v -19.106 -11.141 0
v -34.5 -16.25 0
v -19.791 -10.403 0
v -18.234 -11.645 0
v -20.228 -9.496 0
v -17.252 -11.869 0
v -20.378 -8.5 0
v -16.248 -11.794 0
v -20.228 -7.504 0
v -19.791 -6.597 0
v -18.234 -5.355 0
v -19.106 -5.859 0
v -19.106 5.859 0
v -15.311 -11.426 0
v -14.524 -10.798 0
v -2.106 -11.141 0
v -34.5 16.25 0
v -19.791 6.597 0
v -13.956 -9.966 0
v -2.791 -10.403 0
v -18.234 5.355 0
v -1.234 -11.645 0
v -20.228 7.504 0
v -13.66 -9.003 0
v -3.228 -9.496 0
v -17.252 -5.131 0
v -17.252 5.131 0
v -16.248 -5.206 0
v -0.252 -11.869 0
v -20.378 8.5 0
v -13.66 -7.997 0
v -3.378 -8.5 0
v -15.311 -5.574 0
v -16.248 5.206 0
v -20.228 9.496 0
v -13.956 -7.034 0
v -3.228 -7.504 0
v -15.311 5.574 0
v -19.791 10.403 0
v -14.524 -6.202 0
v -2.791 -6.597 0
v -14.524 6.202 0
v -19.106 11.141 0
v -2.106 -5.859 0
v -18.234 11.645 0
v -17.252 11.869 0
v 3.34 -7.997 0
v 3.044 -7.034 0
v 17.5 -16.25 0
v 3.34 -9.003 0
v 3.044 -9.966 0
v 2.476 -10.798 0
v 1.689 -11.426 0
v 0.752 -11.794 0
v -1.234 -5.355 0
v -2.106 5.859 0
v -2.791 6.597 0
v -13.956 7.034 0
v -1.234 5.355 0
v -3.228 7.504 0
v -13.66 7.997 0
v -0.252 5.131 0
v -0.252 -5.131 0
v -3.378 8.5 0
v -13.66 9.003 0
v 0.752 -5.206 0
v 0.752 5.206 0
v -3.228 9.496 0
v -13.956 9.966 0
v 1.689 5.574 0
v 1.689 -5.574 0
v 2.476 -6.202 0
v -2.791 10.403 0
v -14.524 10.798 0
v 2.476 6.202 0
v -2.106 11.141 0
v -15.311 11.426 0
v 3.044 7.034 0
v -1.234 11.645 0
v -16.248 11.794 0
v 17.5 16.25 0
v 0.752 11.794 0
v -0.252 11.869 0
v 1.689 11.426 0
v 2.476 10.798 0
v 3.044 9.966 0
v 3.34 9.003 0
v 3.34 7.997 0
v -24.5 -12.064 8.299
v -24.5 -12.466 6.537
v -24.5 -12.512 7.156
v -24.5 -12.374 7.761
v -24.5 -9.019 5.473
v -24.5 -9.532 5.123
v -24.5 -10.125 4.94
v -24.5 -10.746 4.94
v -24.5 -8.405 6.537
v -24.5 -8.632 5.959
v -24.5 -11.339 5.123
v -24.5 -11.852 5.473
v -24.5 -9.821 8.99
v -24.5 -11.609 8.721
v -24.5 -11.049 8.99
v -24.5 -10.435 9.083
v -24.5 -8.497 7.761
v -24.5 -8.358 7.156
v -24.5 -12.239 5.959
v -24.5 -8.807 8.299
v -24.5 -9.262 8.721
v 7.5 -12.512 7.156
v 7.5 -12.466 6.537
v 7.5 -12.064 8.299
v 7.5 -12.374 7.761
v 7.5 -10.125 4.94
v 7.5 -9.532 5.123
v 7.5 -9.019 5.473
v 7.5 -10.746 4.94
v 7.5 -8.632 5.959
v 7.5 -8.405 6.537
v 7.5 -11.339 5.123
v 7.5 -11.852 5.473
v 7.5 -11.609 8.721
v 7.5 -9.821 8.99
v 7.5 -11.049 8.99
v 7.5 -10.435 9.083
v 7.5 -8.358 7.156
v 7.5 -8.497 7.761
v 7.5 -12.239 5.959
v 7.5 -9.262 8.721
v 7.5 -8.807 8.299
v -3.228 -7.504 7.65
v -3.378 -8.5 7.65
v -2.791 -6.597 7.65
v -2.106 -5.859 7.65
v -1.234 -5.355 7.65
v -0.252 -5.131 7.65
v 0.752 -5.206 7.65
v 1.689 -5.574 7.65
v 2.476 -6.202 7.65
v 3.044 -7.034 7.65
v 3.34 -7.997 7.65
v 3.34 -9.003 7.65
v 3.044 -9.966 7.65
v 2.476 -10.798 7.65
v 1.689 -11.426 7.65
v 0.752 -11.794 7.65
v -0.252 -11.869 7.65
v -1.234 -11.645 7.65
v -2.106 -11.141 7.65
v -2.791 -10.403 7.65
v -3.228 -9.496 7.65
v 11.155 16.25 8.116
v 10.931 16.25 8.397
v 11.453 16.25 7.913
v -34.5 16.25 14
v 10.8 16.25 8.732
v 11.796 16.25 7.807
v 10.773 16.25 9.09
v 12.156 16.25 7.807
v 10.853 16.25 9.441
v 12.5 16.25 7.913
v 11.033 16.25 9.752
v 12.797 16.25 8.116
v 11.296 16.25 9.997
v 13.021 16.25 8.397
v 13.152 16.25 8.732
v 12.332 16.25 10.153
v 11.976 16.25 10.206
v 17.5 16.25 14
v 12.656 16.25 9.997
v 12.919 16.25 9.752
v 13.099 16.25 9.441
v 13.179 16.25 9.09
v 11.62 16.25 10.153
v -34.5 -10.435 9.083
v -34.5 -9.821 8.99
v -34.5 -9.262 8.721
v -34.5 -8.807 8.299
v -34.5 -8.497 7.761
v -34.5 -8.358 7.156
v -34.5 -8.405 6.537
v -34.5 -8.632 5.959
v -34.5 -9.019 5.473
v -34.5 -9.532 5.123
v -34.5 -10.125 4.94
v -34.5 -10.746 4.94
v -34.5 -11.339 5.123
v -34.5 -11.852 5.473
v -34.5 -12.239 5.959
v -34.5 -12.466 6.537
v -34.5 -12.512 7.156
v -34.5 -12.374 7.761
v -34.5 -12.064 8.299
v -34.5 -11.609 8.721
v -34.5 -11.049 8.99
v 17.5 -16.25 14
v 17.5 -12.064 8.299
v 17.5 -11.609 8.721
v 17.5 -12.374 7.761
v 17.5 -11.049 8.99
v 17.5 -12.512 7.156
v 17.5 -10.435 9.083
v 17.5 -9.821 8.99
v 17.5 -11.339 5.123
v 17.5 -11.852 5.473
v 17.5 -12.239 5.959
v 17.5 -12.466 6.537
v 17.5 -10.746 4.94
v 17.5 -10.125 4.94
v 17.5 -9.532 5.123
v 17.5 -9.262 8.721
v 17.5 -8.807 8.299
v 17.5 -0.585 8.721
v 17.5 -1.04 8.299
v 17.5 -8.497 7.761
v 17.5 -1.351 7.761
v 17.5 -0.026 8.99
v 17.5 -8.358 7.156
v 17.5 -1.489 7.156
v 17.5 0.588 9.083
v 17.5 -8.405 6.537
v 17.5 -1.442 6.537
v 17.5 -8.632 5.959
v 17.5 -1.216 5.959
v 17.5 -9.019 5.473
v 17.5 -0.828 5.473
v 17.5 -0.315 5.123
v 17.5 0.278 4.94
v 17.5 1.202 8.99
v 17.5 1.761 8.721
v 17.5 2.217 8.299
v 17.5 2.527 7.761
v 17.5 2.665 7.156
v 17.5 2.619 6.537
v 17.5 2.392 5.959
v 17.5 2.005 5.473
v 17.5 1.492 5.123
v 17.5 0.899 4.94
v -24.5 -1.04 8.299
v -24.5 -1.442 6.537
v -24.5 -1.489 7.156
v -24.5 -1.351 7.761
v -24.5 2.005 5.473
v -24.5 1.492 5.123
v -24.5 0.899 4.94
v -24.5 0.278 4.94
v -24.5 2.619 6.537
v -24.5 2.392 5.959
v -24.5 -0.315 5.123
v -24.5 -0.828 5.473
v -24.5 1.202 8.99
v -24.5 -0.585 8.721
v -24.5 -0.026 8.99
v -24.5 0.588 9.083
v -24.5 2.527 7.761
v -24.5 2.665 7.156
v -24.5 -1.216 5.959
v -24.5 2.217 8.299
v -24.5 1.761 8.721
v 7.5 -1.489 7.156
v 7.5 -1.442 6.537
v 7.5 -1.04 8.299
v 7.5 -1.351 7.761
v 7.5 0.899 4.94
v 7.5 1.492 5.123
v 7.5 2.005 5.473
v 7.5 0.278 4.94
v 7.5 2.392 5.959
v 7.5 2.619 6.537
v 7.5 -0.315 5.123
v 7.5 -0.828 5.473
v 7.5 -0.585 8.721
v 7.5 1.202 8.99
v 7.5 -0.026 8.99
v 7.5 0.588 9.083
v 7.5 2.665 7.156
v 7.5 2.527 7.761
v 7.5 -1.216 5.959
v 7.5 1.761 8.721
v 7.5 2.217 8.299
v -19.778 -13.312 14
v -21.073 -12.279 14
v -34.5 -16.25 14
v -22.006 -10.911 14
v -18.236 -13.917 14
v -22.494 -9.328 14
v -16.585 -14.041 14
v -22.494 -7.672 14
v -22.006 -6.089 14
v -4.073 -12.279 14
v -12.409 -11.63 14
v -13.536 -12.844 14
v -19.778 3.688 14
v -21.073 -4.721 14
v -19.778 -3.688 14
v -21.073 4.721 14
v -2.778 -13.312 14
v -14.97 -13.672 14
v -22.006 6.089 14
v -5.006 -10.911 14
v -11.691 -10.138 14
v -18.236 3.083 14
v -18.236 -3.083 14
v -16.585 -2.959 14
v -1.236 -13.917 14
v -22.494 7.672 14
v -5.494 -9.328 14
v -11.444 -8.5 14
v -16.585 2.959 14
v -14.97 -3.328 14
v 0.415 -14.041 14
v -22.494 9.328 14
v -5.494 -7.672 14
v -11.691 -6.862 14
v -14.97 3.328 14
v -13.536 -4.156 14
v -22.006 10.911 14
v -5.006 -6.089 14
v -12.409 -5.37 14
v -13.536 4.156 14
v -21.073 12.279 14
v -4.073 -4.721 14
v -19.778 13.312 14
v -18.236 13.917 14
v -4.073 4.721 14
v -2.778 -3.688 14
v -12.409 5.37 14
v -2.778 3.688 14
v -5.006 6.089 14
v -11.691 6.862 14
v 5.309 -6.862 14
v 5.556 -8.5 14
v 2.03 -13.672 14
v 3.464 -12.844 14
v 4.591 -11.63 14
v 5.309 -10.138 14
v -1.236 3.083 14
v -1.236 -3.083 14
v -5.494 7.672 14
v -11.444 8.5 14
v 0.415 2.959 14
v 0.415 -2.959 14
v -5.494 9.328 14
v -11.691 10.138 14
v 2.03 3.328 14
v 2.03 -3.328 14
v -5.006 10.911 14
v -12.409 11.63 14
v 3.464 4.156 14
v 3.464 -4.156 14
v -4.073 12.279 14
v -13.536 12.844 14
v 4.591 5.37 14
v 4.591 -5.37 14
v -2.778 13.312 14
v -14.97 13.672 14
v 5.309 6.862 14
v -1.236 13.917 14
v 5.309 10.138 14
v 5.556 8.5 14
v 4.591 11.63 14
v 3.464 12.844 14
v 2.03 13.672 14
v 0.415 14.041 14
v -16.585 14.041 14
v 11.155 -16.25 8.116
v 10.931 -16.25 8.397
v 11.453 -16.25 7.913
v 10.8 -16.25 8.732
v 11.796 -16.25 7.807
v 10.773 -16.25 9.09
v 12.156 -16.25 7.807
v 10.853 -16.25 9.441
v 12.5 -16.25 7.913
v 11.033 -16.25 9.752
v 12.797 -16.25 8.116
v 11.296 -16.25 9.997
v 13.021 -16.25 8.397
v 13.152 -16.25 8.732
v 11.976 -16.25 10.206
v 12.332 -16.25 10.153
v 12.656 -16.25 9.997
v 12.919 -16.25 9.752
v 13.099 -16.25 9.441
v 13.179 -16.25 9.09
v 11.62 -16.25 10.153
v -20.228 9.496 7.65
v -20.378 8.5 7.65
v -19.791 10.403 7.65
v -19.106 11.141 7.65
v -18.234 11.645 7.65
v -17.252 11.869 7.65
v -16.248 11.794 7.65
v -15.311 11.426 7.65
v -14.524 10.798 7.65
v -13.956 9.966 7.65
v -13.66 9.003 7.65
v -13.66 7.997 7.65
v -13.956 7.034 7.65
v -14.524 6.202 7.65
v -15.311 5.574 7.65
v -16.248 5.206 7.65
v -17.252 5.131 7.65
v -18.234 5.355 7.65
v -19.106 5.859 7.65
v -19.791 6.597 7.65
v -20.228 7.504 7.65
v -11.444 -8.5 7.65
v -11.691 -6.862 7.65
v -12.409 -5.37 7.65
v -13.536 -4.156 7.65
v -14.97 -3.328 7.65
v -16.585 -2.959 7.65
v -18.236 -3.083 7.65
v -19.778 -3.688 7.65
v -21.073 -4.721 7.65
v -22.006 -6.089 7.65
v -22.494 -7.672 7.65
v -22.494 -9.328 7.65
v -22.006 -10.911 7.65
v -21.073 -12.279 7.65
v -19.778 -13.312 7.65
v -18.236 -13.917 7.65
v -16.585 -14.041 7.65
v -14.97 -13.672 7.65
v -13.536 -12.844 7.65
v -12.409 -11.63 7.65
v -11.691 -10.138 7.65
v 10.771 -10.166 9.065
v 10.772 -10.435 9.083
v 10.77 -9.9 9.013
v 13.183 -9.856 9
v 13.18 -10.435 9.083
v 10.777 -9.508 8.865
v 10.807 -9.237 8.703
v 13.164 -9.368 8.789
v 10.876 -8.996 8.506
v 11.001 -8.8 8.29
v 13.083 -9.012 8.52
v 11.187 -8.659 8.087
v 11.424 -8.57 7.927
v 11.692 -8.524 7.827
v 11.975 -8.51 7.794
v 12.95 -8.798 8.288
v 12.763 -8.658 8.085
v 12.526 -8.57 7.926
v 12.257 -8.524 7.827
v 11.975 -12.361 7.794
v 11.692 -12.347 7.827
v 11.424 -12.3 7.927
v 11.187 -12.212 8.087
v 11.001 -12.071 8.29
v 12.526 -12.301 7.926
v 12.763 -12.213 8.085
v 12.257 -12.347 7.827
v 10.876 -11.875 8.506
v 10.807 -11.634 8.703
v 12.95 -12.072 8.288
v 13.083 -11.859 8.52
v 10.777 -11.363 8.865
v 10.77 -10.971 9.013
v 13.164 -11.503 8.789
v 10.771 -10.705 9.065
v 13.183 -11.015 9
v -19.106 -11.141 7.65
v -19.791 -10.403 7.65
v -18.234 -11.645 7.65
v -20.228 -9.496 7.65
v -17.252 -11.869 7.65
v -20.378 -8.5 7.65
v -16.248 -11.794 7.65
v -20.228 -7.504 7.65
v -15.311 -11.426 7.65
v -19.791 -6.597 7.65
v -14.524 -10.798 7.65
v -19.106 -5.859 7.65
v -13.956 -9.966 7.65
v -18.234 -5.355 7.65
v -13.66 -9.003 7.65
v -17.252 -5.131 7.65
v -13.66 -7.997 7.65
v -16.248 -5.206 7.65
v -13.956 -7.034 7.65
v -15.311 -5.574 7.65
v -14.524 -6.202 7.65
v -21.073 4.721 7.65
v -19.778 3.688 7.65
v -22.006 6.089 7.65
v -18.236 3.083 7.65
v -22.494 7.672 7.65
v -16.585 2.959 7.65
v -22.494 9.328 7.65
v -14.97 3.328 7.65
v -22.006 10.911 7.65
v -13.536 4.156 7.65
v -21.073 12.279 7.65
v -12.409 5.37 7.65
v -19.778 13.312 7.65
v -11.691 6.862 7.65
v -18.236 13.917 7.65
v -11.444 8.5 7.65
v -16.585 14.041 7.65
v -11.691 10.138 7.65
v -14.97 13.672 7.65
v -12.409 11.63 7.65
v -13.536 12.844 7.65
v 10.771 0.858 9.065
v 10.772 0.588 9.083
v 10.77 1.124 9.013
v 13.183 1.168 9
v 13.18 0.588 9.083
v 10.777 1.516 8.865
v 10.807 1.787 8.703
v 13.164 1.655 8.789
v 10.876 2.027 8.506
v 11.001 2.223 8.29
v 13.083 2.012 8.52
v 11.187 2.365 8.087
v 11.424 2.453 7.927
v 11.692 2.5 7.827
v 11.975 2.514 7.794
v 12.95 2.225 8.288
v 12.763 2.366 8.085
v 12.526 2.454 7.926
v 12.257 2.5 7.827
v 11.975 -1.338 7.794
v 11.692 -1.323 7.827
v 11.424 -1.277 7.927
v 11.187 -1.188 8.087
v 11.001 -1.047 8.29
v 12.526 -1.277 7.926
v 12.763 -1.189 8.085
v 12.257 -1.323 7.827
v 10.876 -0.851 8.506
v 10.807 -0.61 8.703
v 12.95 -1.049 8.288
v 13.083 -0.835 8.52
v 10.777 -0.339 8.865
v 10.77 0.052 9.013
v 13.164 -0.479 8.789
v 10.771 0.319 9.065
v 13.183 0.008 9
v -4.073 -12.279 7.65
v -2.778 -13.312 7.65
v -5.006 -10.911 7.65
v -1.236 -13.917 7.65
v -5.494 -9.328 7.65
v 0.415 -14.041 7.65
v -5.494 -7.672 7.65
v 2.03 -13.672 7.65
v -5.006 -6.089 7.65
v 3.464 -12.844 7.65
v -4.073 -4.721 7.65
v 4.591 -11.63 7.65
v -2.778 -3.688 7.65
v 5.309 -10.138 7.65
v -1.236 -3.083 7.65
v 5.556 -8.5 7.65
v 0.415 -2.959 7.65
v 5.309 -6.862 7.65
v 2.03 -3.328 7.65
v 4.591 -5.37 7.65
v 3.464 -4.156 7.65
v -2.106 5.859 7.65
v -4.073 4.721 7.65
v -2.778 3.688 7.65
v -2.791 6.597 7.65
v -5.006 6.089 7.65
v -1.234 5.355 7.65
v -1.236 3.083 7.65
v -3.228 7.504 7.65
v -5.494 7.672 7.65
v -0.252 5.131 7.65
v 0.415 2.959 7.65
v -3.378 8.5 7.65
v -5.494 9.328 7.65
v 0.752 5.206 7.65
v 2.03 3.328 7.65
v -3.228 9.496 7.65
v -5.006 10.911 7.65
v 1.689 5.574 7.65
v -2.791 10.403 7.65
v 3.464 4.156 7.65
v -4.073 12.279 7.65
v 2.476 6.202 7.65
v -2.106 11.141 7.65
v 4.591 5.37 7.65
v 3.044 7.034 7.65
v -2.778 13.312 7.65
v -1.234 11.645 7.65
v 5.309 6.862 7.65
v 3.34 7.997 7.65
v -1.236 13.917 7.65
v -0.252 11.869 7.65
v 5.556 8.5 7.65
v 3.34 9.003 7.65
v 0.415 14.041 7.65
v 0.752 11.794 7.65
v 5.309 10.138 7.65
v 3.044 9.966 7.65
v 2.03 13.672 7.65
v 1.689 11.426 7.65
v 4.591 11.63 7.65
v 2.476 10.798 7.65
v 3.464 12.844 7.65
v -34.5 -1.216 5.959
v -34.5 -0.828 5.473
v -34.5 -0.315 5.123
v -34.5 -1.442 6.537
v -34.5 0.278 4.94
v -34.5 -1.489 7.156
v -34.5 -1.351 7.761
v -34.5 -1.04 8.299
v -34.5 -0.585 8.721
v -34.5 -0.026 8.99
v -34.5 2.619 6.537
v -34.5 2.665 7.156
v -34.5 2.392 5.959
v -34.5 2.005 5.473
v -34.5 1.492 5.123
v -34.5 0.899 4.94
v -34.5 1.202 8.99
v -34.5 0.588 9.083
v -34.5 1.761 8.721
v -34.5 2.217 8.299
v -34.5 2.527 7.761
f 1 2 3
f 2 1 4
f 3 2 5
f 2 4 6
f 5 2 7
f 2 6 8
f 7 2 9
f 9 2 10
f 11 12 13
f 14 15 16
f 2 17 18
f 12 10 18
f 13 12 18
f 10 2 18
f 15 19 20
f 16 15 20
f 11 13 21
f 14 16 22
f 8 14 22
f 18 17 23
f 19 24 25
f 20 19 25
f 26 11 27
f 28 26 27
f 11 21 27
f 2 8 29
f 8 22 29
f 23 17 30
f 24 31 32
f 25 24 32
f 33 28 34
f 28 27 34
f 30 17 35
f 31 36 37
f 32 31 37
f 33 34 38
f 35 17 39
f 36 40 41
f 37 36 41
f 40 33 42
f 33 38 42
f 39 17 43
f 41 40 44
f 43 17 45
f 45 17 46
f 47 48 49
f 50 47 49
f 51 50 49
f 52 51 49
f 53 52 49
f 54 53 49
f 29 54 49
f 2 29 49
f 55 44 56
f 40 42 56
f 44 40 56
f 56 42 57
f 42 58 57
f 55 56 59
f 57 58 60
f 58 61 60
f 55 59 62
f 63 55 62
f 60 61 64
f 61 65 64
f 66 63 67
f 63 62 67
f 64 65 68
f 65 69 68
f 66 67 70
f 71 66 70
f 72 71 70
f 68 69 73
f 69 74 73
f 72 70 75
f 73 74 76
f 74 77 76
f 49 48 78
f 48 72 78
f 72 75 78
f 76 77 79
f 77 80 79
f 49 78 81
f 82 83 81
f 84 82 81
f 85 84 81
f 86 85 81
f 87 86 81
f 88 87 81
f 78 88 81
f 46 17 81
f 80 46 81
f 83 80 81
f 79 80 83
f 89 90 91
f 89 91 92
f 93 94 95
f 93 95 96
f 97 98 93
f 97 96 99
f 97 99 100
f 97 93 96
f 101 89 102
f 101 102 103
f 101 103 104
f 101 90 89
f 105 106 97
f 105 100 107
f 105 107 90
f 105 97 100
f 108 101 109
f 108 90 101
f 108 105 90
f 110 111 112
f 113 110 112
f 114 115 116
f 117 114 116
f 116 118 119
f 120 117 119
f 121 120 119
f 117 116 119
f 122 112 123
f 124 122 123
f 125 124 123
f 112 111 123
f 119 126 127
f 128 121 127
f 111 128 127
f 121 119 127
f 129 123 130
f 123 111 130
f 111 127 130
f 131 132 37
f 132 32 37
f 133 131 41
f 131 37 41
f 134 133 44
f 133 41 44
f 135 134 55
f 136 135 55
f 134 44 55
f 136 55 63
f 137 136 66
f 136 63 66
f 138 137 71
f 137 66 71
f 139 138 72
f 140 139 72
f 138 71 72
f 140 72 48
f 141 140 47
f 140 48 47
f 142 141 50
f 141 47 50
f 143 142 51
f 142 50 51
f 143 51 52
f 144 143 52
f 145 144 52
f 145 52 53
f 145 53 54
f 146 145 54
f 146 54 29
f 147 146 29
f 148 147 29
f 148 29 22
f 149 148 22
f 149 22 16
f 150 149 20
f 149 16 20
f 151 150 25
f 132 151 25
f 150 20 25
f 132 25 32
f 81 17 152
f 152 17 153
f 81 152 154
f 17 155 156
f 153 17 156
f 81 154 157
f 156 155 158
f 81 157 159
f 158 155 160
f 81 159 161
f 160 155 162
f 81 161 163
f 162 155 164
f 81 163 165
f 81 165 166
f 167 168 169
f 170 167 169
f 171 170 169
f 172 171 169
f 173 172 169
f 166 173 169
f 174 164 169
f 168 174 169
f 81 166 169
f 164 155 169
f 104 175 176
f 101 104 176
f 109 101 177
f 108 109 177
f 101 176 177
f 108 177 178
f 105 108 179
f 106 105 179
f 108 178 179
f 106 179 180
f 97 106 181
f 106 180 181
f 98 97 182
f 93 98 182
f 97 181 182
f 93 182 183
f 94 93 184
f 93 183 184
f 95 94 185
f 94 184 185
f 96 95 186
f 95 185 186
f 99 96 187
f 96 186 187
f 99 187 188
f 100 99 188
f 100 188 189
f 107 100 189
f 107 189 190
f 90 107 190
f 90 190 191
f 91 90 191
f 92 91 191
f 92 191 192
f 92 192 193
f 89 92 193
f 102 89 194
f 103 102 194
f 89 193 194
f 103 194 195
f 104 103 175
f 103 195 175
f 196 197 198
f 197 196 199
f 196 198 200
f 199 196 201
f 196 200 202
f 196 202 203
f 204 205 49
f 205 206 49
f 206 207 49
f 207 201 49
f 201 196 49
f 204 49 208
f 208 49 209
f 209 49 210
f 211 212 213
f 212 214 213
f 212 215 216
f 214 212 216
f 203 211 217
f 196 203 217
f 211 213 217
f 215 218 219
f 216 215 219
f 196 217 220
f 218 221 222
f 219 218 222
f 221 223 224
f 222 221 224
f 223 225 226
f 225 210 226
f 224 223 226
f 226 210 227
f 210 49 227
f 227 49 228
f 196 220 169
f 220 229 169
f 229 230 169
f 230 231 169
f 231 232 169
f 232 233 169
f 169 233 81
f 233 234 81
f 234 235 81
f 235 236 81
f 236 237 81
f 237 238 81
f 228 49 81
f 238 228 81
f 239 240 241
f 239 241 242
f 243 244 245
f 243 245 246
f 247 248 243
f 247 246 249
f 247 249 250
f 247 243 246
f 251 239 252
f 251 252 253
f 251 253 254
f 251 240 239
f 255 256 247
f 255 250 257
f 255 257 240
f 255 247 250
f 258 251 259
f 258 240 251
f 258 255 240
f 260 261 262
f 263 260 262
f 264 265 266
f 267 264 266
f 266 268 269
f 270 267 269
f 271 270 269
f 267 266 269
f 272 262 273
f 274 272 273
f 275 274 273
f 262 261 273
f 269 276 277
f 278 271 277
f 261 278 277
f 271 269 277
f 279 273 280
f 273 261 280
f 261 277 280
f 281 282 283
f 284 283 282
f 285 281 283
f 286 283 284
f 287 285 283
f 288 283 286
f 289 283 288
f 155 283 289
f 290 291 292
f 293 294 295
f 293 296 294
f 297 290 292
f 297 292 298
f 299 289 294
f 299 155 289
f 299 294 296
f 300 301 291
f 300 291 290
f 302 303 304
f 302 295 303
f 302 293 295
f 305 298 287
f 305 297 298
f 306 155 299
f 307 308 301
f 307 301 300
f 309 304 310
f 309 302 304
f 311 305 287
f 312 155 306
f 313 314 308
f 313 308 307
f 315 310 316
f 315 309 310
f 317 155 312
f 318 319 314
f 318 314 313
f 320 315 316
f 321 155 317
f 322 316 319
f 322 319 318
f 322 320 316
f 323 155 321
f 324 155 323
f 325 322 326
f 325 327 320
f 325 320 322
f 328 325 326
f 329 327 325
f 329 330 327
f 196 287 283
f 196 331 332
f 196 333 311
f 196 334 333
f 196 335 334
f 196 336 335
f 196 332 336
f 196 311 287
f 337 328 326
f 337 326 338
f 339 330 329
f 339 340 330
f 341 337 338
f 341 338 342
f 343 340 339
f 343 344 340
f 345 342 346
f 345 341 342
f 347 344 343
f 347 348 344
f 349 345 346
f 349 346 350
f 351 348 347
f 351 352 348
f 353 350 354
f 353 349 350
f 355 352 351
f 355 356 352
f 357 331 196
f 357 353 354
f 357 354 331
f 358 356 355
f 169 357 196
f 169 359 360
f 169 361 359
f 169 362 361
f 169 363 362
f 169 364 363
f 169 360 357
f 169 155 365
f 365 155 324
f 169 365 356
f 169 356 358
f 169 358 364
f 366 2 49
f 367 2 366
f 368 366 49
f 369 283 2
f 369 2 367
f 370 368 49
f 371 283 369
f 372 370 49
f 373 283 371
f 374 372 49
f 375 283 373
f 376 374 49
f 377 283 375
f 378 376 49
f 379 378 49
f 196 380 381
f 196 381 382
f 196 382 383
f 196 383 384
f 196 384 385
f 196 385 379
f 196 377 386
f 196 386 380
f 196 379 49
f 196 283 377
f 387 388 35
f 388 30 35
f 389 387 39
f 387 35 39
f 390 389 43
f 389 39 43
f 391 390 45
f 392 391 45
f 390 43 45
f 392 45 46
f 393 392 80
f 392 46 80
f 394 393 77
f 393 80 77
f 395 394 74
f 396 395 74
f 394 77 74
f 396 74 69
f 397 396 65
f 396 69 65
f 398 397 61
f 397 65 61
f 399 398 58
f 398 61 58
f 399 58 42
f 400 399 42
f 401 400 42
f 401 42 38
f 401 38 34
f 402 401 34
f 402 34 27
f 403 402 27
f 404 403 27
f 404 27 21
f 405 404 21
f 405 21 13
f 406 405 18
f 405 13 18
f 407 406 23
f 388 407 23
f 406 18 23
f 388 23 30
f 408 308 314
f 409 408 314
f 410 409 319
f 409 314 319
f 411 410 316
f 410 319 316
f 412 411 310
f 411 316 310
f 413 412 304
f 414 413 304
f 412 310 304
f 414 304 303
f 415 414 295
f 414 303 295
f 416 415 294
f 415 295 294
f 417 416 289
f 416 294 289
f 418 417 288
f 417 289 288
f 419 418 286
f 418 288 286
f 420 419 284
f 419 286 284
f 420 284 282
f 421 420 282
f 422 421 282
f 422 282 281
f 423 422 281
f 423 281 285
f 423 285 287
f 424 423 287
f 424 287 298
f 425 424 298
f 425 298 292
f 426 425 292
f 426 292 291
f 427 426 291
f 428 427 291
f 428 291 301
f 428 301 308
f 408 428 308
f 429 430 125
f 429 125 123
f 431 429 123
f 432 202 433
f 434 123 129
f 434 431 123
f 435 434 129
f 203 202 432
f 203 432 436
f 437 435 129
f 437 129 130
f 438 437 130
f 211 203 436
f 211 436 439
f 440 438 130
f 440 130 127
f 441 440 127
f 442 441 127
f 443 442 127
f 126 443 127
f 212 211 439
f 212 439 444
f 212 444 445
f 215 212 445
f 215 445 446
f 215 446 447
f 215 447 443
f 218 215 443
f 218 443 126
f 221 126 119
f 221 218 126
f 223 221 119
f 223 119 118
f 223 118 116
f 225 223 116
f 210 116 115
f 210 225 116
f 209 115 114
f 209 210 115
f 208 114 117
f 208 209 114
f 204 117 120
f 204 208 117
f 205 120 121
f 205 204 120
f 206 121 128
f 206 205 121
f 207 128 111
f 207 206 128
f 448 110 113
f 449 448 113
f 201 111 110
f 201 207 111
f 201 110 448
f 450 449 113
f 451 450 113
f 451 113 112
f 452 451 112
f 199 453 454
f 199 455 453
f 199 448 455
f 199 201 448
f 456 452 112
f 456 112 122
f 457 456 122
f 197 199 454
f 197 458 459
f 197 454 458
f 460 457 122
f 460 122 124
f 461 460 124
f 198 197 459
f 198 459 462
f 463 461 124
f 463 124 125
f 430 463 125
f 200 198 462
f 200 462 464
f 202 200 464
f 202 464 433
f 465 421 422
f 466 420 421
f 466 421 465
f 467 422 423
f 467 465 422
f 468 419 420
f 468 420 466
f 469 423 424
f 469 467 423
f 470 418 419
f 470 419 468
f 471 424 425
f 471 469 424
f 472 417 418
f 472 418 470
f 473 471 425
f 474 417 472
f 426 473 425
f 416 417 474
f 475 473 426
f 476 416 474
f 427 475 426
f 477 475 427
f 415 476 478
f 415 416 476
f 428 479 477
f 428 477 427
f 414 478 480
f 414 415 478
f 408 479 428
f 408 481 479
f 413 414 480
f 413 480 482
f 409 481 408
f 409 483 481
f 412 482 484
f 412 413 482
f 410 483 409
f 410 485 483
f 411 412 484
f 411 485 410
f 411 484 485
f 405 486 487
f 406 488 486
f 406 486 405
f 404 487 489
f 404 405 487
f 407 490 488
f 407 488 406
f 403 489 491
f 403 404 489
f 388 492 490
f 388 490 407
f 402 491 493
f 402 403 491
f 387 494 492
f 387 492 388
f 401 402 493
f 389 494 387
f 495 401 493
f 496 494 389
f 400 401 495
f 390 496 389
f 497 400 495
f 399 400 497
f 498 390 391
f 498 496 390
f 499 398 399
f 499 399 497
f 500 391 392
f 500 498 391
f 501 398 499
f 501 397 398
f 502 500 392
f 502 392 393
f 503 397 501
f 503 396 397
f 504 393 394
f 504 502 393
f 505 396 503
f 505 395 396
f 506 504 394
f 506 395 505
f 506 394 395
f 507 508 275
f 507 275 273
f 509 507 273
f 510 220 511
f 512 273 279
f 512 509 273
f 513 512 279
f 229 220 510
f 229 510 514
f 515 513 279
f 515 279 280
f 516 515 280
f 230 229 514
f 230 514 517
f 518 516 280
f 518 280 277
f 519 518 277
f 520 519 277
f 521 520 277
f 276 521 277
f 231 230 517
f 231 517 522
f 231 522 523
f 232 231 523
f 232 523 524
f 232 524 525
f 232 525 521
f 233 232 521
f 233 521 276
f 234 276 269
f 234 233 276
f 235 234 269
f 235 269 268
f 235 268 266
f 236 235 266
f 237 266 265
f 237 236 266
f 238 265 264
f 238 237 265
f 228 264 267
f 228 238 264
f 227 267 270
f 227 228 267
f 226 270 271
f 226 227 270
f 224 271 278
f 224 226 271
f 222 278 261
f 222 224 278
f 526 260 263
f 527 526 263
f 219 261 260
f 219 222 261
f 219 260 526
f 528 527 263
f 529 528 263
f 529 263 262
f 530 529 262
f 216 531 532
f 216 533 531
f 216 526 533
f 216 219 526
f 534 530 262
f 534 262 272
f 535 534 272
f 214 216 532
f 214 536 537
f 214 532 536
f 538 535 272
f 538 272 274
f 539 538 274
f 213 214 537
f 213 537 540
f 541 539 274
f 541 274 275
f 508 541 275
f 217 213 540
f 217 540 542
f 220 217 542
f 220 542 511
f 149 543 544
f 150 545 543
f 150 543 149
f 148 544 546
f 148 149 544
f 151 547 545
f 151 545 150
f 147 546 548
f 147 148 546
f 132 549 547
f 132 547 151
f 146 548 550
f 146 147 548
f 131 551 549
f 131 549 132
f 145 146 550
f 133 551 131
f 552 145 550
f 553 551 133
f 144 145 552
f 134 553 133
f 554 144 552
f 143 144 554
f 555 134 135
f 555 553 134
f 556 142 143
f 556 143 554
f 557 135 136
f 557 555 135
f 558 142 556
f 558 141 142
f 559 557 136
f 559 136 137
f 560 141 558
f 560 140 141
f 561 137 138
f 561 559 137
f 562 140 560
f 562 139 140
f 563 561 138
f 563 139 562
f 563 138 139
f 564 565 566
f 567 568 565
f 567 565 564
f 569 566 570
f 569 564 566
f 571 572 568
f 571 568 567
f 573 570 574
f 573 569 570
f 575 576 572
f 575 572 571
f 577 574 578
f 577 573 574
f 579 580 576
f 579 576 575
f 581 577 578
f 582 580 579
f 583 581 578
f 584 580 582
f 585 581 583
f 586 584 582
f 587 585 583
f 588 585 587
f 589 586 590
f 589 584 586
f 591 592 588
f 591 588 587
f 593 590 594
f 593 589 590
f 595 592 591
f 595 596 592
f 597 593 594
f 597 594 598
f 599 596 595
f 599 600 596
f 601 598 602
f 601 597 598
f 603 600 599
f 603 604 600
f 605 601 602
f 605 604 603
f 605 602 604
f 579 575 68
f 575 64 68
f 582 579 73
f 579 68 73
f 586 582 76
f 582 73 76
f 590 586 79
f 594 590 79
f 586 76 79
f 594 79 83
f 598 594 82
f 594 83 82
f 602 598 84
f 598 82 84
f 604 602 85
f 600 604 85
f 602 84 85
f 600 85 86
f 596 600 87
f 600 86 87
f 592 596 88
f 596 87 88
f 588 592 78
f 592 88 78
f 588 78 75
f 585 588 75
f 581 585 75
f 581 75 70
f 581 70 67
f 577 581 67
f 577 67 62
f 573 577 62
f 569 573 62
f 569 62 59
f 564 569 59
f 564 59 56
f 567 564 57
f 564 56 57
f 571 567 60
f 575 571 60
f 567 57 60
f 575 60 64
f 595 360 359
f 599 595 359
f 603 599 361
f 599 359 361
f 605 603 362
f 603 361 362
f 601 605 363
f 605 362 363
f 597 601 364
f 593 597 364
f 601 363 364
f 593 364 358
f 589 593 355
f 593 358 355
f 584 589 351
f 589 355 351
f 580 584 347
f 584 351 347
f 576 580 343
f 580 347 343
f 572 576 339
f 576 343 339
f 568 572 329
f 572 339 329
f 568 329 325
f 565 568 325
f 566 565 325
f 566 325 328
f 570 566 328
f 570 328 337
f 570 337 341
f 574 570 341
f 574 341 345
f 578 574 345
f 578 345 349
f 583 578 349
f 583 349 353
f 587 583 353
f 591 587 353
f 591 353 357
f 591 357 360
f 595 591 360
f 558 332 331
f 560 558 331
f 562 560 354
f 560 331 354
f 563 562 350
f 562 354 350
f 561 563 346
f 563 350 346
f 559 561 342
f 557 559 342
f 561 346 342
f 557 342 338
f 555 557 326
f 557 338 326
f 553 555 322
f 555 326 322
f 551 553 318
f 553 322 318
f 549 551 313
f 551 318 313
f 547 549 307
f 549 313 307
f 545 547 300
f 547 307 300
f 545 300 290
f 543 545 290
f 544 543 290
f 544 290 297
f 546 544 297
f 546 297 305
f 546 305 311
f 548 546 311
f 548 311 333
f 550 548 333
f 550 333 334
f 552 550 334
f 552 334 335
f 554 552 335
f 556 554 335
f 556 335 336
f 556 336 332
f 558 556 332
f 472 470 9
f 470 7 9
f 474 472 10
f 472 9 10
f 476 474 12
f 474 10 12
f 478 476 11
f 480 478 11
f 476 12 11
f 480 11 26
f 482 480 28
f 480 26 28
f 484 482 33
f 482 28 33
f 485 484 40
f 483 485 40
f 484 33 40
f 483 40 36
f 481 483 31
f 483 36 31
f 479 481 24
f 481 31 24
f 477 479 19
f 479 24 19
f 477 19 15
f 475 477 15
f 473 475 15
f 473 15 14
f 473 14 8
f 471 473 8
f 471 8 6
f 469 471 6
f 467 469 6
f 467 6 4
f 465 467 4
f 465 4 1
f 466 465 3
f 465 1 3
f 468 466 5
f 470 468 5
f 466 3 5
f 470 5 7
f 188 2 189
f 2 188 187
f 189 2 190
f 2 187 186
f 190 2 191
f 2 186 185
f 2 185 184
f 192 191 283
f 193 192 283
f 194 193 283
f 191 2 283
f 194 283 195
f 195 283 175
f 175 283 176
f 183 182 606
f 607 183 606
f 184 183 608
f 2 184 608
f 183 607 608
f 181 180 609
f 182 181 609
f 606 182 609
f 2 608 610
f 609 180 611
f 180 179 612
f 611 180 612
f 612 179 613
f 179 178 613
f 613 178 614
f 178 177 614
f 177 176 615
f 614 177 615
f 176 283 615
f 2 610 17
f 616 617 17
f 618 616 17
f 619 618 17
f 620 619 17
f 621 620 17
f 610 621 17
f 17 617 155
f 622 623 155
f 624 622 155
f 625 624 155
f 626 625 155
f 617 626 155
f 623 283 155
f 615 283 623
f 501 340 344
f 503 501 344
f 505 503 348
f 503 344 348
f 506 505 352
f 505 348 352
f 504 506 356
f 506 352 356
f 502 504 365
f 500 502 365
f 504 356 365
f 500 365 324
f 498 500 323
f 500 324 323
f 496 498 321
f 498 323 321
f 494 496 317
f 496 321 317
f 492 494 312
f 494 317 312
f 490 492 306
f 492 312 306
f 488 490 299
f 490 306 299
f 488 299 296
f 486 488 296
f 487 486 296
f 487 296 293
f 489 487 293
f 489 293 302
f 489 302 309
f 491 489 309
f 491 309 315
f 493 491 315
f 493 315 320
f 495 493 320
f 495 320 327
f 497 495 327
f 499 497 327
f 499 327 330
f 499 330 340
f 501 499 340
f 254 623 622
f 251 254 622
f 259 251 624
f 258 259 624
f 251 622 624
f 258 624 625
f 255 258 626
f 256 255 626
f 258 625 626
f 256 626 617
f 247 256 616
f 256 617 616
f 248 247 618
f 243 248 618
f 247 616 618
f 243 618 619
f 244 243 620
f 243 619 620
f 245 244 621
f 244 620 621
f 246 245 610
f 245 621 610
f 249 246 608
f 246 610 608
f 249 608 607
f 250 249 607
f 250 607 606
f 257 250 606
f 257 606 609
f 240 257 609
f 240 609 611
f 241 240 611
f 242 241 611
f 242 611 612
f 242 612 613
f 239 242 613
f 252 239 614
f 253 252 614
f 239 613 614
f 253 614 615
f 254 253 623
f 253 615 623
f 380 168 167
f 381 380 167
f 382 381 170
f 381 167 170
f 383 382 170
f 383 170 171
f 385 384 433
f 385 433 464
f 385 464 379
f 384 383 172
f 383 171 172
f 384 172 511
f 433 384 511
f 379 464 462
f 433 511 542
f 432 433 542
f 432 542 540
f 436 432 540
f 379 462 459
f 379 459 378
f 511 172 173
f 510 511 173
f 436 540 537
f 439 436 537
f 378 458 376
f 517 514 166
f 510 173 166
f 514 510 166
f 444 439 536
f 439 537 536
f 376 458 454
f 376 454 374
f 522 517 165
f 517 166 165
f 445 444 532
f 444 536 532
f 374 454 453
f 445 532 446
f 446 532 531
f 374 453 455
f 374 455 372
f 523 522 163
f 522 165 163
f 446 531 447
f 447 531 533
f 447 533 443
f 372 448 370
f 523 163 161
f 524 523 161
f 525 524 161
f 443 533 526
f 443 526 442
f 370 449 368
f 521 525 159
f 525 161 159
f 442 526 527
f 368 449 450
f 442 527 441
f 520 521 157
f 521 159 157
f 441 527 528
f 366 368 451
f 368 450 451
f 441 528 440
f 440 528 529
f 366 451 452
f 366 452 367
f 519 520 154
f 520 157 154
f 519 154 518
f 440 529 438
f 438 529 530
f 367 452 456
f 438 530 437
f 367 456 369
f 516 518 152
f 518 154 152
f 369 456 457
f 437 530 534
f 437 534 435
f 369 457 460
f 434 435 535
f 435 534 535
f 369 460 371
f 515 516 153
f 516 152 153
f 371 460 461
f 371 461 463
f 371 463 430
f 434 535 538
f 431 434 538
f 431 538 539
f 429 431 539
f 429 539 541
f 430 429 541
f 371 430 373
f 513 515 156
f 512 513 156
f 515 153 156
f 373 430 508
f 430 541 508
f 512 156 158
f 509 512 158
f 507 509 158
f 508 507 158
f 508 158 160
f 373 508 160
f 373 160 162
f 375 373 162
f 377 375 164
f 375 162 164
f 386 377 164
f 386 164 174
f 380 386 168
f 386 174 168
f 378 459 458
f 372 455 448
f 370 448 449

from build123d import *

# Parameters (mm, degrees)
SKETCH1_W                                        = 35
SKETCH1_H                                        = 32.5
BOSS_EXTRUDE1_DEPTH                              = 14
CBORE_FOR_1_4_SOCKET_HEAD_CAP_SCREW1_D           = 6.7564
CBORE_FOR_1_4_SOCKET_HEAD_CAP_SCREW1_CBORE_D     = 11.1125
CBORE_FOR_1_4_SOCKET_HEAD_CAP_SCREW1_CBORE_DEPTH = 6.35
SKETCH18_R                                       = 1.2065
SPRING_END_HOLE_DEPTH                            = 40.477841886
SKETCH19_W                                       = 17
SKETCH19_H                                       = 32.5
BOSS_EXTRUDE2_DEPTH                              = 14
CBORE_FOR_1_4_SOCKET_HEAD_CAP_SCREW2_D           = 6.7564
CBORE_FOR_1_4_SOCKET_HEAD_CAP_SCREW2_CBORE_D     = 11.1125
CBORE_FOR_1_4_SOCKET_HEAD_CAP_SCREW2_CBORE_DEPTH = 6.35
SKETCH22_R                                       = 2.0828
CUT_EXTRUDE1_DEPTH                               = 10


with BuildPart() as part:
    # Sketch1 → Boss-Extrude1 (new body)
    with BuildSketch(Plane.XY):
        Rectangle(SKETCH1_W, SKETCH1_H)
    extrude(amount=BOSS_EXTRUDE1_DEPTH)

    # CBORE for 1/4 Socket Head Cap Screw1 (through all)
    with Locations(Plane.XY.offset(14)):
        with Locations((0, -8.5), (0, 8.5)):
            CounterBoreHole(CBORE_FOR_1_4_SOCKET_HEAD_CAP_SCREW1_D / 2, CBORE_FOR_1_4_SOCKET_HEAD_CAP_SCREW1_CBORE_D / 2, CBORE_FOR_1_4_SOCKET_HEAD_CAP_SCREW1_CBORE_DEPTH)

    # Sketch18 → Spring-End Hole (cut, through all)
    with BuildSketch(Plane(origin=(0, 16.25, 0), x_dir=(1, 0, 0), z_dir=(0, 1, 0))):
        with Locations(Location((11.9761, -9, 0), (0, 0, 270))):
            Circle(SKETCH18_R)
    extrude(amount=-SPRING_END_HOLE_DEPTH, mode=Mode.SUBTRACT)

    # Sketch19 → Boss-Extrude2 (add)
    with BuildSketch(Plane.XY.offset(14)):
        with Locations((-26, 0)):
            Rectangle(SKETCH19_W, SKETCH19_H)
    extrude(amount=-BOSS_EXTRUDE2_DEPTH)

    # CBORE for 1/4 Socket Head Cap Screw2 (through all)
    with Locations(Plane.XY.offset(14)):
        with Locations((-17, 8.5), (-17, -8.5)):
            CounterBoreHole(CBORE_FOR_1_4_SOCKET_HEAD_CAP_SCREW2_D / 2, CBORE_FOR_1_4_SOCKET_HEAD_CAP_SCREW2_CBORE_D / 2, CBORE_FOR_1_4_SOCKET_HEAD_CAP_SCREW2_CBORE_DEPTH)

    # Sketch22 → Cut-Extrude1 (cut)
    with BuildSketch(Plane.ZY.offset(34.5)):
        with Locations((7, 0.5882)):
            Circle(SKETCH22_R)
        with Locations((7, -10.4354)):
            Circle(SKETCH22_R)
    cut_extrude1 = extrude(amount=-CUT_EXTRUDE1_DEPTH, mode=Mode.SUBTRACT)

    # Mirror1: Cut-Extrude1 across plane
    add(cut_extrude1.mirror(Plane(origin=(-8.5, 0, 0), x_dir=(0, 0, 1), z_dir=(1, 0, 0))), mode=Mode.SUBTRACT)


solid = part.part
